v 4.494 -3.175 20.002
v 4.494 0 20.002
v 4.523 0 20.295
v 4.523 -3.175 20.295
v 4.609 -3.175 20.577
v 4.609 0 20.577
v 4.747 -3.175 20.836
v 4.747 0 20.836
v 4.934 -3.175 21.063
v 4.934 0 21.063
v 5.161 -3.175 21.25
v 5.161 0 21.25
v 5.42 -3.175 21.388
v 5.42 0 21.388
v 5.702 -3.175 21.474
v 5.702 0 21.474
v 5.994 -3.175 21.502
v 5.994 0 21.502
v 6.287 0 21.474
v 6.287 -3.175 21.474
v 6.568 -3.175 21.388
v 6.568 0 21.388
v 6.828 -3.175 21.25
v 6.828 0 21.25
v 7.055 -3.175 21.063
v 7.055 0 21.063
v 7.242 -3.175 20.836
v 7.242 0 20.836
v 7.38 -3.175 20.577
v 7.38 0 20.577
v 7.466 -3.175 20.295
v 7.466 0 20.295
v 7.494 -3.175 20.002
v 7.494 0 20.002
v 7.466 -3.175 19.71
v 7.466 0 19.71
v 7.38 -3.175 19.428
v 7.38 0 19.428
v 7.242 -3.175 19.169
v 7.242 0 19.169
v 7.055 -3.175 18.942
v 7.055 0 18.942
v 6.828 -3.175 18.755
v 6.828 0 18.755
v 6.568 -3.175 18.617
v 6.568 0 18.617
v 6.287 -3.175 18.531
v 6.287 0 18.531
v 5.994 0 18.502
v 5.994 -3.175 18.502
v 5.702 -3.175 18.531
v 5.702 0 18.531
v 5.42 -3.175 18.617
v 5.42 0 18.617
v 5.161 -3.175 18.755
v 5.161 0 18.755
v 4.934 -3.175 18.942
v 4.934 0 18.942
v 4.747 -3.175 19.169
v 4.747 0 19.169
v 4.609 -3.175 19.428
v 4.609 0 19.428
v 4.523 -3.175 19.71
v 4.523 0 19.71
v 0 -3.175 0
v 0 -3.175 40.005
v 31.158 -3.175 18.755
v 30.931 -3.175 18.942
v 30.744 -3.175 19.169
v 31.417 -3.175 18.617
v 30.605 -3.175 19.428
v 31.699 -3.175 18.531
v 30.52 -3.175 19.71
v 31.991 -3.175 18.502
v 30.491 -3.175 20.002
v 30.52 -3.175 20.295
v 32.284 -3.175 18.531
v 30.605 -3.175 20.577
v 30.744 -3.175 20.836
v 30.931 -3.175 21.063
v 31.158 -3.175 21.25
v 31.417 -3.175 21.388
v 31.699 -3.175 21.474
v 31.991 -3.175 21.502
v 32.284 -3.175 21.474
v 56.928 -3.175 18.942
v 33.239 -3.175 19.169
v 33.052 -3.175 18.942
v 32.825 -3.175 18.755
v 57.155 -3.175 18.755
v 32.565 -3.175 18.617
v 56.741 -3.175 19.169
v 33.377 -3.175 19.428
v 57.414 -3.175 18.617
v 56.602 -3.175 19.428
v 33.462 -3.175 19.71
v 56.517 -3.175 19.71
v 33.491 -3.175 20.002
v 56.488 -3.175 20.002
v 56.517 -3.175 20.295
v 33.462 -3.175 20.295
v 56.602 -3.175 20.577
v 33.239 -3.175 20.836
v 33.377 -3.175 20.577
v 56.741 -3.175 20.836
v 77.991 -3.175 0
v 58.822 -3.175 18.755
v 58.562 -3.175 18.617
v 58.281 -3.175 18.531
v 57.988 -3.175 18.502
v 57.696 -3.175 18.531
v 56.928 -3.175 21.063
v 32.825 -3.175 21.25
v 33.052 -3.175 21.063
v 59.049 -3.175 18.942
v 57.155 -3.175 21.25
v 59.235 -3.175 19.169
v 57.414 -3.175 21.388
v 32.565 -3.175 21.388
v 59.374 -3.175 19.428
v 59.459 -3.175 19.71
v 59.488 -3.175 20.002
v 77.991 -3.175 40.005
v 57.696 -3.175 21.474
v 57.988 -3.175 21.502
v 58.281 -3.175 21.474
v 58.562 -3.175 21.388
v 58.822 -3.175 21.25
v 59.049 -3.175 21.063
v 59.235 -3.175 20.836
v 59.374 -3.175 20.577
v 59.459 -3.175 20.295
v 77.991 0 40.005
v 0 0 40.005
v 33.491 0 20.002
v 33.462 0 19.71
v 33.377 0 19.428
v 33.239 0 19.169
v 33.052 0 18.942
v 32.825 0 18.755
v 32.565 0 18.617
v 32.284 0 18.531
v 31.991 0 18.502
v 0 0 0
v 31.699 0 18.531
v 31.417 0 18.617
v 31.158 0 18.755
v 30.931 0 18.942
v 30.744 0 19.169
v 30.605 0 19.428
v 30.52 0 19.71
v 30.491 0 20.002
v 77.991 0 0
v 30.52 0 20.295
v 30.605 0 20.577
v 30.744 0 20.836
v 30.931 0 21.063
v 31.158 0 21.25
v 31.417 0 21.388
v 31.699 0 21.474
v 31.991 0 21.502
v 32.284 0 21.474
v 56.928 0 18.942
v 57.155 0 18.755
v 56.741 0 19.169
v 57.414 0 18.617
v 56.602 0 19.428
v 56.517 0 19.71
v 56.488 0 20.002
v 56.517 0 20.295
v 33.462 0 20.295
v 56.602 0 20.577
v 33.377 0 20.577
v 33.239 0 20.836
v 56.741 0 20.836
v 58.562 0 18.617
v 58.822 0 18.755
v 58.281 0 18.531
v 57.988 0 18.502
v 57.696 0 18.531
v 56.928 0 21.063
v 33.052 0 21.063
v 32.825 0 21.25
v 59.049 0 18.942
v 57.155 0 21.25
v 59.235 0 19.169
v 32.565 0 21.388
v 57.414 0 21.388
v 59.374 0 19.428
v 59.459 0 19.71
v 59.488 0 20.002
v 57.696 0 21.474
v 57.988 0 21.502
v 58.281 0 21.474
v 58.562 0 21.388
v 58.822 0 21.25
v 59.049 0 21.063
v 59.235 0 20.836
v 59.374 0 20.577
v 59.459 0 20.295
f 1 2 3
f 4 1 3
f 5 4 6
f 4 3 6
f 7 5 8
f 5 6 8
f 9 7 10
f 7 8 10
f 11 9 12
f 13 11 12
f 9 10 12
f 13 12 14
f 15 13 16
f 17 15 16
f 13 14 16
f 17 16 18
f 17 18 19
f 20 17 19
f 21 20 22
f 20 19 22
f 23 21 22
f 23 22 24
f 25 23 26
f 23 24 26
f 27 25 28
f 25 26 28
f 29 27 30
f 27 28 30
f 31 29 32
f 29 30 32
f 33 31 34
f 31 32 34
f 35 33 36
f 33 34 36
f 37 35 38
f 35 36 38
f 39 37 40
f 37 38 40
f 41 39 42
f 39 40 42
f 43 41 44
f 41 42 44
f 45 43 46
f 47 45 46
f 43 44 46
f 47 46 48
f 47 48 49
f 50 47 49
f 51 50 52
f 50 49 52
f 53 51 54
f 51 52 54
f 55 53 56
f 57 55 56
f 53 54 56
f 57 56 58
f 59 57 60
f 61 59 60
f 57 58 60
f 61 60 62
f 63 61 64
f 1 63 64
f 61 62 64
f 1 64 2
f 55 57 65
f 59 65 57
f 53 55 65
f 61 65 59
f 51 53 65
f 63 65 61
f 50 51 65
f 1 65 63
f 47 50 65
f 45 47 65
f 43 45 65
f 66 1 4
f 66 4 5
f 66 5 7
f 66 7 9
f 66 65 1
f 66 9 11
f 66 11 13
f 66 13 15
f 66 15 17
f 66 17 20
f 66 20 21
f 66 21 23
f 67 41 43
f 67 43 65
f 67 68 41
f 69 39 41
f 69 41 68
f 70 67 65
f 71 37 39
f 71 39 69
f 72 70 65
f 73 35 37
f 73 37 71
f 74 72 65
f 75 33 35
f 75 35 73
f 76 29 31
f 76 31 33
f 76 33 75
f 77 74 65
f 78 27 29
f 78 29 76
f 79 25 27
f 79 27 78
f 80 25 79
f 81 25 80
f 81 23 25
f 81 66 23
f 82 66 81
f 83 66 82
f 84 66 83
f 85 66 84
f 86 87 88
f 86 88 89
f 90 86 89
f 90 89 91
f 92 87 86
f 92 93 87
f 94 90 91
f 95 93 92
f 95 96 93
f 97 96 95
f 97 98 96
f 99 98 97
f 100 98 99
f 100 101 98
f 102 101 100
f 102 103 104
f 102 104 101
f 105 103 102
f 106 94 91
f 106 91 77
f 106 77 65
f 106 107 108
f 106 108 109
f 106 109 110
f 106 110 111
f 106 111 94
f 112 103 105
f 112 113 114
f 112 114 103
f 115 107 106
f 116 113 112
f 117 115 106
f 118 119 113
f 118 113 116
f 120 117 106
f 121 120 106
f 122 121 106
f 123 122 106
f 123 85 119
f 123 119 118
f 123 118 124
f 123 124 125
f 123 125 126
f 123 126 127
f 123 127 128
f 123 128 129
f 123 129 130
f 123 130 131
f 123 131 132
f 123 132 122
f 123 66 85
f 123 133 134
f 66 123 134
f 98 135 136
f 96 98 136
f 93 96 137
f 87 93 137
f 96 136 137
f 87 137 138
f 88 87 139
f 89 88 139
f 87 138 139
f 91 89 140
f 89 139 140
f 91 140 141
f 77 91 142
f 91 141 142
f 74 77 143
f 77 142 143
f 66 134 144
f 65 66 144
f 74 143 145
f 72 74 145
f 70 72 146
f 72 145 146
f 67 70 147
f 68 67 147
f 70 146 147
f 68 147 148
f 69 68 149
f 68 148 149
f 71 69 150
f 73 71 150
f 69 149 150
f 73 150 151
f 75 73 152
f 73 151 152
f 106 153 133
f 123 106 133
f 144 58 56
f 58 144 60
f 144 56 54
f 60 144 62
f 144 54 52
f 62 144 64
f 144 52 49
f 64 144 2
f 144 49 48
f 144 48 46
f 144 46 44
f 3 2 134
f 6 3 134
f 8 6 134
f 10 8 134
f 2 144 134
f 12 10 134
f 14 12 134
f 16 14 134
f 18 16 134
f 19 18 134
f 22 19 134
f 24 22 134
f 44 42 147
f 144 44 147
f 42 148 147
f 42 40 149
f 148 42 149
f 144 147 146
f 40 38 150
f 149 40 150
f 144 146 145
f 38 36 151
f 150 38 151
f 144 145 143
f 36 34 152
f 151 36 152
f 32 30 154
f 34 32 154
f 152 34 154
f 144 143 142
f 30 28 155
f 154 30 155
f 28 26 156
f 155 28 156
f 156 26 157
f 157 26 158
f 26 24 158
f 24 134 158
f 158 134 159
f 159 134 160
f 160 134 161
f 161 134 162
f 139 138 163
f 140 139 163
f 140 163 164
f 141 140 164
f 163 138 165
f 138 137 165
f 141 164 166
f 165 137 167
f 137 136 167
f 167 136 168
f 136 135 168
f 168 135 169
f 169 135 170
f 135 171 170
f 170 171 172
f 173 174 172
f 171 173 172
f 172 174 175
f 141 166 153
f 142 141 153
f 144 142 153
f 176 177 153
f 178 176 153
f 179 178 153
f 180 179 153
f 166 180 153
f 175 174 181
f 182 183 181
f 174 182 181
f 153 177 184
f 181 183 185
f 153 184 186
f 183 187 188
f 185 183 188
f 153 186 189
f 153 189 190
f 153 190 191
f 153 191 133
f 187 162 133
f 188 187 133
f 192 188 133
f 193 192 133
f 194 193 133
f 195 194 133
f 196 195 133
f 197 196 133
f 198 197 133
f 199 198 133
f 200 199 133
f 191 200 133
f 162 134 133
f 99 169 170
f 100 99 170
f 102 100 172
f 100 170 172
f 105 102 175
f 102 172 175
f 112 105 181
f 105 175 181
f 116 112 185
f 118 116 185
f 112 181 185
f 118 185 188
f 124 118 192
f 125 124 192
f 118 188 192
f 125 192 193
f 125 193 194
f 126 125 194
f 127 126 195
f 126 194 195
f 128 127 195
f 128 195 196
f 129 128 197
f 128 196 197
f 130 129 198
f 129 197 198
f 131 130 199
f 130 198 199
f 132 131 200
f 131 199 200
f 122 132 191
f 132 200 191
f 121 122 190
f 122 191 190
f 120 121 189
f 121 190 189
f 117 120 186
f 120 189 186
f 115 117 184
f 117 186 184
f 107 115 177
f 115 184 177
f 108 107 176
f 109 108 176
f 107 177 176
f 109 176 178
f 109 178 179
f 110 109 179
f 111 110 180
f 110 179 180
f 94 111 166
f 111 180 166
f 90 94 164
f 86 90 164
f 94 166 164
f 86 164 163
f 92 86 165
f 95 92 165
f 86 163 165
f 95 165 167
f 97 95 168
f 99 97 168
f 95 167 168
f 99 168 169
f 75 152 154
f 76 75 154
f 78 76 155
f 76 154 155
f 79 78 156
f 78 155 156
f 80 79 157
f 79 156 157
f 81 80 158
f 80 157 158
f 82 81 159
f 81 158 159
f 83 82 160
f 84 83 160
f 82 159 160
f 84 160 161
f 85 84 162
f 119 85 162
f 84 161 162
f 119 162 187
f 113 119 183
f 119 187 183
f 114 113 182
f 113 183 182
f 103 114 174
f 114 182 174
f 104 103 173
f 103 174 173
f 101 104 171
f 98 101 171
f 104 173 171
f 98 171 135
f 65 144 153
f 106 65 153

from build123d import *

# Parameters (mm, degrees)
F1_DEPTH = 3.175


with BuildPart() as f1:
    # F0 (on Front) → F1 (new body)
    with BuildSketch(Plane.XZ):
        Polygon((0, 20.0025), (0, 0), (77.9907, 0), (77.9907, 40.005), (0, 40.005), align=None)
        with BuildLine():
            ThreePointArc((7.4944, 20.0025), (5.9944, 18.5025), (4.4944, 20.0025))
            ThreePointArc((4.4944, 20.0025), (5.9944, 21.5025), (7.4944, 20.0025))
        make_face(mode=Mode.SUBTRACT)
        with BuildLine():
            ThreePointArc((31.9913, 18.5025), (30.93064, 18.94184), (30.4913, 20.0025))
            ThreePointArc((30.4913, 20.0025), (31.9913, 21.5025), (33.4913, 20.0025))
            ThreePointArc((33.4913, 20.0025), (33.05196, 18.94184), (31.9913, 18.5025))
        make_face(mode=Mode.SUBTRACT)
        with BuildLine():
            ThreePointArc((59.4882, 20.0025), (57.9882, 18.5025), (56.4882, 20.0025))
            ThreePointArc((56.4882, 20.0025), (57.9882, 21.5025), (59.4882, 20.0025))
        make_face(mode=Mode.SUBTRACT)
    extrude(amount=F1_DEPTH)


solid = f1.part
